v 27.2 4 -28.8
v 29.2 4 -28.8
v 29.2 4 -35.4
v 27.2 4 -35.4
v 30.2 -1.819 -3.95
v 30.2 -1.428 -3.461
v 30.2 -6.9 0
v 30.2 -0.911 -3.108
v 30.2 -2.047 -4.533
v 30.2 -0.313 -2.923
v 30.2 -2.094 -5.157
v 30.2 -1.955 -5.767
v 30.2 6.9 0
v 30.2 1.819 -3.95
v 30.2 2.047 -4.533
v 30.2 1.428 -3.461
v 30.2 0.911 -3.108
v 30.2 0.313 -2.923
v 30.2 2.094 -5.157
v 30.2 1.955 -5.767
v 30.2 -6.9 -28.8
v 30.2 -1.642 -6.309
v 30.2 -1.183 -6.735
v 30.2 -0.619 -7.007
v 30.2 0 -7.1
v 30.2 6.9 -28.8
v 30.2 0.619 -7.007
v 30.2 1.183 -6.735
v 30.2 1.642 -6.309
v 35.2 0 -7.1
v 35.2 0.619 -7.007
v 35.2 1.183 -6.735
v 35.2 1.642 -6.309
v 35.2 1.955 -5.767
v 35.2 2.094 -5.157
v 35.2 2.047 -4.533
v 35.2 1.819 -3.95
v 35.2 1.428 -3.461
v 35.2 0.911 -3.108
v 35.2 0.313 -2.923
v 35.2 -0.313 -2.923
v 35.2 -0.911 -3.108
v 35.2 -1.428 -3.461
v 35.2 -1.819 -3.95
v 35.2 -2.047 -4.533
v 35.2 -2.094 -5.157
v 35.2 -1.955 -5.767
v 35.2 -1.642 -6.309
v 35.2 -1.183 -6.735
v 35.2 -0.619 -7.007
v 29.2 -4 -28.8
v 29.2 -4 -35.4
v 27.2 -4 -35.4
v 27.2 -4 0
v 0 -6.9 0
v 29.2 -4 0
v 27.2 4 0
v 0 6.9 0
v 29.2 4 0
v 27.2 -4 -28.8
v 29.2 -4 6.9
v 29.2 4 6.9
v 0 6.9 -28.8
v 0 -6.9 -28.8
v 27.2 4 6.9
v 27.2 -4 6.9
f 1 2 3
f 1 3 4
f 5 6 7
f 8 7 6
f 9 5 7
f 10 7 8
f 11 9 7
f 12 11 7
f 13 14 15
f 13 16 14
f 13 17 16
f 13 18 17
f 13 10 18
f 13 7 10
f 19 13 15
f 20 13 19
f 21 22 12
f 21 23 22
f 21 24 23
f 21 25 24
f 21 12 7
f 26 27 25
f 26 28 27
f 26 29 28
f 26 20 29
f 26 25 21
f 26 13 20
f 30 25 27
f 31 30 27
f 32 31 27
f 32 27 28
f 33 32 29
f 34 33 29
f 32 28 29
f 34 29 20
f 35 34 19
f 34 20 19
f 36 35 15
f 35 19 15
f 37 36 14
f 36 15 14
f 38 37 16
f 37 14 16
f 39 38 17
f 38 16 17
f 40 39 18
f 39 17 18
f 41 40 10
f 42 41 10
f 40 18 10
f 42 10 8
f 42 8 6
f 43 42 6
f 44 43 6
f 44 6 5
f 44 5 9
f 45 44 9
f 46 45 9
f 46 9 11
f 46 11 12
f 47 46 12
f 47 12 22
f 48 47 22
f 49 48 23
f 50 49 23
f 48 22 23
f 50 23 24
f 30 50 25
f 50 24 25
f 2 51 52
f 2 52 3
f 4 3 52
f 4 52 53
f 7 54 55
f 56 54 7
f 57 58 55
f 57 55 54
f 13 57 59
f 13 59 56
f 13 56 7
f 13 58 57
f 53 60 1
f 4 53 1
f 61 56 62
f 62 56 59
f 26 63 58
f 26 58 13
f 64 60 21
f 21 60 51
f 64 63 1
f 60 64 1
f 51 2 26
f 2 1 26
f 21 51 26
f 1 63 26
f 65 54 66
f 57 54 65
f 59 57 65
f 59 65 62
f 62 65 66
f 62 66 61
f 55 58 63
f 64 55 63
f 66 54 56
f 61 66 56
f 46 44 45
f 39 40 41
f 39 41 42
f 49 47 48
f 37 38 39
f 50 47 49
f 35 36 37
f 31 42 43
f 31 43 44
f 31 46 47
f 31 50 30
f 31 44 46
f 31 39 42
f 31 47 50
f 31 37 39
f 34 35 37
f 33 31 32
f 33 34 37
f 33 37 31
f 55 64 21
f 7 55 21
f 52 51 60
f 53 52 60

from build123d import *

# Parameters (mm, degrees)
SKETCH1_W           = 30.2
SKETCH1_H           = 28.8
BOSS_EXTRUDE1_DEPTH = 6.9
SKETCH2_R           = 2.1
BOSS_EXTRUDE2_DEPTH = 5
SKETCH3_W           = 2
SKETCH3_H           = 8
BOSS_EXTRUDE3_DEPTH = 6.9
SKETCH4_W           = 2
SKETCH4_H           = 8
BOSS_EXTRUDE4_DEPTH = 6.6


with BuildPart() as part:
    # Sketch1 → Boss-Extrude1 (new body, symmetric)
    with BuildSketch(Plane(origin=(0, 0, 0), x_dir=(1, 0, 0), z_dir=(0, 1, 0))):
        with Locations((15.1, 14.4)):
            Rectangle(SKETCH1_W, SKETCH1_H)
    extrude(amount=BOSS_EXTRUDE1_DEPTH, both=True)

    # Sketch2 → Boss-Extrude2 (add)
    with BuildSketch(Plane(origin=(30.2, 0, 0), x_dir=(0, 0, -1), z_dir=(1, 0, 0))):
        with Locations((5, 0)):
            Circle(SKETCH2_R)
    extrude(amount=BOSS_EXTRUDE2_DEPTH)

    # Sketch3 → Boss-Extrude3 (add)
    with BuildSketch(Plane.XY):
        with Locations((28.2, 0)):
            Rectangle(SKETCH3_W, SKETCH3_H)
    extrude(amount=BOSS_EXTRUDE3_DEPTH)

    # Sketch4 → Boss-Extrude4 (add)
    with BuildSketch(Plane(origin=(0, 0, -28.8), x_dir=(-1, 0, 0), z_dir=(0, 0, -1))):
        with Locations((-28.2, 0)):
            Rectangle(SKETCH4_W, SKETCH4_H)
    extrude(amount=BOSS_EXTRUDE4_DEPTH)


solid = part.part
